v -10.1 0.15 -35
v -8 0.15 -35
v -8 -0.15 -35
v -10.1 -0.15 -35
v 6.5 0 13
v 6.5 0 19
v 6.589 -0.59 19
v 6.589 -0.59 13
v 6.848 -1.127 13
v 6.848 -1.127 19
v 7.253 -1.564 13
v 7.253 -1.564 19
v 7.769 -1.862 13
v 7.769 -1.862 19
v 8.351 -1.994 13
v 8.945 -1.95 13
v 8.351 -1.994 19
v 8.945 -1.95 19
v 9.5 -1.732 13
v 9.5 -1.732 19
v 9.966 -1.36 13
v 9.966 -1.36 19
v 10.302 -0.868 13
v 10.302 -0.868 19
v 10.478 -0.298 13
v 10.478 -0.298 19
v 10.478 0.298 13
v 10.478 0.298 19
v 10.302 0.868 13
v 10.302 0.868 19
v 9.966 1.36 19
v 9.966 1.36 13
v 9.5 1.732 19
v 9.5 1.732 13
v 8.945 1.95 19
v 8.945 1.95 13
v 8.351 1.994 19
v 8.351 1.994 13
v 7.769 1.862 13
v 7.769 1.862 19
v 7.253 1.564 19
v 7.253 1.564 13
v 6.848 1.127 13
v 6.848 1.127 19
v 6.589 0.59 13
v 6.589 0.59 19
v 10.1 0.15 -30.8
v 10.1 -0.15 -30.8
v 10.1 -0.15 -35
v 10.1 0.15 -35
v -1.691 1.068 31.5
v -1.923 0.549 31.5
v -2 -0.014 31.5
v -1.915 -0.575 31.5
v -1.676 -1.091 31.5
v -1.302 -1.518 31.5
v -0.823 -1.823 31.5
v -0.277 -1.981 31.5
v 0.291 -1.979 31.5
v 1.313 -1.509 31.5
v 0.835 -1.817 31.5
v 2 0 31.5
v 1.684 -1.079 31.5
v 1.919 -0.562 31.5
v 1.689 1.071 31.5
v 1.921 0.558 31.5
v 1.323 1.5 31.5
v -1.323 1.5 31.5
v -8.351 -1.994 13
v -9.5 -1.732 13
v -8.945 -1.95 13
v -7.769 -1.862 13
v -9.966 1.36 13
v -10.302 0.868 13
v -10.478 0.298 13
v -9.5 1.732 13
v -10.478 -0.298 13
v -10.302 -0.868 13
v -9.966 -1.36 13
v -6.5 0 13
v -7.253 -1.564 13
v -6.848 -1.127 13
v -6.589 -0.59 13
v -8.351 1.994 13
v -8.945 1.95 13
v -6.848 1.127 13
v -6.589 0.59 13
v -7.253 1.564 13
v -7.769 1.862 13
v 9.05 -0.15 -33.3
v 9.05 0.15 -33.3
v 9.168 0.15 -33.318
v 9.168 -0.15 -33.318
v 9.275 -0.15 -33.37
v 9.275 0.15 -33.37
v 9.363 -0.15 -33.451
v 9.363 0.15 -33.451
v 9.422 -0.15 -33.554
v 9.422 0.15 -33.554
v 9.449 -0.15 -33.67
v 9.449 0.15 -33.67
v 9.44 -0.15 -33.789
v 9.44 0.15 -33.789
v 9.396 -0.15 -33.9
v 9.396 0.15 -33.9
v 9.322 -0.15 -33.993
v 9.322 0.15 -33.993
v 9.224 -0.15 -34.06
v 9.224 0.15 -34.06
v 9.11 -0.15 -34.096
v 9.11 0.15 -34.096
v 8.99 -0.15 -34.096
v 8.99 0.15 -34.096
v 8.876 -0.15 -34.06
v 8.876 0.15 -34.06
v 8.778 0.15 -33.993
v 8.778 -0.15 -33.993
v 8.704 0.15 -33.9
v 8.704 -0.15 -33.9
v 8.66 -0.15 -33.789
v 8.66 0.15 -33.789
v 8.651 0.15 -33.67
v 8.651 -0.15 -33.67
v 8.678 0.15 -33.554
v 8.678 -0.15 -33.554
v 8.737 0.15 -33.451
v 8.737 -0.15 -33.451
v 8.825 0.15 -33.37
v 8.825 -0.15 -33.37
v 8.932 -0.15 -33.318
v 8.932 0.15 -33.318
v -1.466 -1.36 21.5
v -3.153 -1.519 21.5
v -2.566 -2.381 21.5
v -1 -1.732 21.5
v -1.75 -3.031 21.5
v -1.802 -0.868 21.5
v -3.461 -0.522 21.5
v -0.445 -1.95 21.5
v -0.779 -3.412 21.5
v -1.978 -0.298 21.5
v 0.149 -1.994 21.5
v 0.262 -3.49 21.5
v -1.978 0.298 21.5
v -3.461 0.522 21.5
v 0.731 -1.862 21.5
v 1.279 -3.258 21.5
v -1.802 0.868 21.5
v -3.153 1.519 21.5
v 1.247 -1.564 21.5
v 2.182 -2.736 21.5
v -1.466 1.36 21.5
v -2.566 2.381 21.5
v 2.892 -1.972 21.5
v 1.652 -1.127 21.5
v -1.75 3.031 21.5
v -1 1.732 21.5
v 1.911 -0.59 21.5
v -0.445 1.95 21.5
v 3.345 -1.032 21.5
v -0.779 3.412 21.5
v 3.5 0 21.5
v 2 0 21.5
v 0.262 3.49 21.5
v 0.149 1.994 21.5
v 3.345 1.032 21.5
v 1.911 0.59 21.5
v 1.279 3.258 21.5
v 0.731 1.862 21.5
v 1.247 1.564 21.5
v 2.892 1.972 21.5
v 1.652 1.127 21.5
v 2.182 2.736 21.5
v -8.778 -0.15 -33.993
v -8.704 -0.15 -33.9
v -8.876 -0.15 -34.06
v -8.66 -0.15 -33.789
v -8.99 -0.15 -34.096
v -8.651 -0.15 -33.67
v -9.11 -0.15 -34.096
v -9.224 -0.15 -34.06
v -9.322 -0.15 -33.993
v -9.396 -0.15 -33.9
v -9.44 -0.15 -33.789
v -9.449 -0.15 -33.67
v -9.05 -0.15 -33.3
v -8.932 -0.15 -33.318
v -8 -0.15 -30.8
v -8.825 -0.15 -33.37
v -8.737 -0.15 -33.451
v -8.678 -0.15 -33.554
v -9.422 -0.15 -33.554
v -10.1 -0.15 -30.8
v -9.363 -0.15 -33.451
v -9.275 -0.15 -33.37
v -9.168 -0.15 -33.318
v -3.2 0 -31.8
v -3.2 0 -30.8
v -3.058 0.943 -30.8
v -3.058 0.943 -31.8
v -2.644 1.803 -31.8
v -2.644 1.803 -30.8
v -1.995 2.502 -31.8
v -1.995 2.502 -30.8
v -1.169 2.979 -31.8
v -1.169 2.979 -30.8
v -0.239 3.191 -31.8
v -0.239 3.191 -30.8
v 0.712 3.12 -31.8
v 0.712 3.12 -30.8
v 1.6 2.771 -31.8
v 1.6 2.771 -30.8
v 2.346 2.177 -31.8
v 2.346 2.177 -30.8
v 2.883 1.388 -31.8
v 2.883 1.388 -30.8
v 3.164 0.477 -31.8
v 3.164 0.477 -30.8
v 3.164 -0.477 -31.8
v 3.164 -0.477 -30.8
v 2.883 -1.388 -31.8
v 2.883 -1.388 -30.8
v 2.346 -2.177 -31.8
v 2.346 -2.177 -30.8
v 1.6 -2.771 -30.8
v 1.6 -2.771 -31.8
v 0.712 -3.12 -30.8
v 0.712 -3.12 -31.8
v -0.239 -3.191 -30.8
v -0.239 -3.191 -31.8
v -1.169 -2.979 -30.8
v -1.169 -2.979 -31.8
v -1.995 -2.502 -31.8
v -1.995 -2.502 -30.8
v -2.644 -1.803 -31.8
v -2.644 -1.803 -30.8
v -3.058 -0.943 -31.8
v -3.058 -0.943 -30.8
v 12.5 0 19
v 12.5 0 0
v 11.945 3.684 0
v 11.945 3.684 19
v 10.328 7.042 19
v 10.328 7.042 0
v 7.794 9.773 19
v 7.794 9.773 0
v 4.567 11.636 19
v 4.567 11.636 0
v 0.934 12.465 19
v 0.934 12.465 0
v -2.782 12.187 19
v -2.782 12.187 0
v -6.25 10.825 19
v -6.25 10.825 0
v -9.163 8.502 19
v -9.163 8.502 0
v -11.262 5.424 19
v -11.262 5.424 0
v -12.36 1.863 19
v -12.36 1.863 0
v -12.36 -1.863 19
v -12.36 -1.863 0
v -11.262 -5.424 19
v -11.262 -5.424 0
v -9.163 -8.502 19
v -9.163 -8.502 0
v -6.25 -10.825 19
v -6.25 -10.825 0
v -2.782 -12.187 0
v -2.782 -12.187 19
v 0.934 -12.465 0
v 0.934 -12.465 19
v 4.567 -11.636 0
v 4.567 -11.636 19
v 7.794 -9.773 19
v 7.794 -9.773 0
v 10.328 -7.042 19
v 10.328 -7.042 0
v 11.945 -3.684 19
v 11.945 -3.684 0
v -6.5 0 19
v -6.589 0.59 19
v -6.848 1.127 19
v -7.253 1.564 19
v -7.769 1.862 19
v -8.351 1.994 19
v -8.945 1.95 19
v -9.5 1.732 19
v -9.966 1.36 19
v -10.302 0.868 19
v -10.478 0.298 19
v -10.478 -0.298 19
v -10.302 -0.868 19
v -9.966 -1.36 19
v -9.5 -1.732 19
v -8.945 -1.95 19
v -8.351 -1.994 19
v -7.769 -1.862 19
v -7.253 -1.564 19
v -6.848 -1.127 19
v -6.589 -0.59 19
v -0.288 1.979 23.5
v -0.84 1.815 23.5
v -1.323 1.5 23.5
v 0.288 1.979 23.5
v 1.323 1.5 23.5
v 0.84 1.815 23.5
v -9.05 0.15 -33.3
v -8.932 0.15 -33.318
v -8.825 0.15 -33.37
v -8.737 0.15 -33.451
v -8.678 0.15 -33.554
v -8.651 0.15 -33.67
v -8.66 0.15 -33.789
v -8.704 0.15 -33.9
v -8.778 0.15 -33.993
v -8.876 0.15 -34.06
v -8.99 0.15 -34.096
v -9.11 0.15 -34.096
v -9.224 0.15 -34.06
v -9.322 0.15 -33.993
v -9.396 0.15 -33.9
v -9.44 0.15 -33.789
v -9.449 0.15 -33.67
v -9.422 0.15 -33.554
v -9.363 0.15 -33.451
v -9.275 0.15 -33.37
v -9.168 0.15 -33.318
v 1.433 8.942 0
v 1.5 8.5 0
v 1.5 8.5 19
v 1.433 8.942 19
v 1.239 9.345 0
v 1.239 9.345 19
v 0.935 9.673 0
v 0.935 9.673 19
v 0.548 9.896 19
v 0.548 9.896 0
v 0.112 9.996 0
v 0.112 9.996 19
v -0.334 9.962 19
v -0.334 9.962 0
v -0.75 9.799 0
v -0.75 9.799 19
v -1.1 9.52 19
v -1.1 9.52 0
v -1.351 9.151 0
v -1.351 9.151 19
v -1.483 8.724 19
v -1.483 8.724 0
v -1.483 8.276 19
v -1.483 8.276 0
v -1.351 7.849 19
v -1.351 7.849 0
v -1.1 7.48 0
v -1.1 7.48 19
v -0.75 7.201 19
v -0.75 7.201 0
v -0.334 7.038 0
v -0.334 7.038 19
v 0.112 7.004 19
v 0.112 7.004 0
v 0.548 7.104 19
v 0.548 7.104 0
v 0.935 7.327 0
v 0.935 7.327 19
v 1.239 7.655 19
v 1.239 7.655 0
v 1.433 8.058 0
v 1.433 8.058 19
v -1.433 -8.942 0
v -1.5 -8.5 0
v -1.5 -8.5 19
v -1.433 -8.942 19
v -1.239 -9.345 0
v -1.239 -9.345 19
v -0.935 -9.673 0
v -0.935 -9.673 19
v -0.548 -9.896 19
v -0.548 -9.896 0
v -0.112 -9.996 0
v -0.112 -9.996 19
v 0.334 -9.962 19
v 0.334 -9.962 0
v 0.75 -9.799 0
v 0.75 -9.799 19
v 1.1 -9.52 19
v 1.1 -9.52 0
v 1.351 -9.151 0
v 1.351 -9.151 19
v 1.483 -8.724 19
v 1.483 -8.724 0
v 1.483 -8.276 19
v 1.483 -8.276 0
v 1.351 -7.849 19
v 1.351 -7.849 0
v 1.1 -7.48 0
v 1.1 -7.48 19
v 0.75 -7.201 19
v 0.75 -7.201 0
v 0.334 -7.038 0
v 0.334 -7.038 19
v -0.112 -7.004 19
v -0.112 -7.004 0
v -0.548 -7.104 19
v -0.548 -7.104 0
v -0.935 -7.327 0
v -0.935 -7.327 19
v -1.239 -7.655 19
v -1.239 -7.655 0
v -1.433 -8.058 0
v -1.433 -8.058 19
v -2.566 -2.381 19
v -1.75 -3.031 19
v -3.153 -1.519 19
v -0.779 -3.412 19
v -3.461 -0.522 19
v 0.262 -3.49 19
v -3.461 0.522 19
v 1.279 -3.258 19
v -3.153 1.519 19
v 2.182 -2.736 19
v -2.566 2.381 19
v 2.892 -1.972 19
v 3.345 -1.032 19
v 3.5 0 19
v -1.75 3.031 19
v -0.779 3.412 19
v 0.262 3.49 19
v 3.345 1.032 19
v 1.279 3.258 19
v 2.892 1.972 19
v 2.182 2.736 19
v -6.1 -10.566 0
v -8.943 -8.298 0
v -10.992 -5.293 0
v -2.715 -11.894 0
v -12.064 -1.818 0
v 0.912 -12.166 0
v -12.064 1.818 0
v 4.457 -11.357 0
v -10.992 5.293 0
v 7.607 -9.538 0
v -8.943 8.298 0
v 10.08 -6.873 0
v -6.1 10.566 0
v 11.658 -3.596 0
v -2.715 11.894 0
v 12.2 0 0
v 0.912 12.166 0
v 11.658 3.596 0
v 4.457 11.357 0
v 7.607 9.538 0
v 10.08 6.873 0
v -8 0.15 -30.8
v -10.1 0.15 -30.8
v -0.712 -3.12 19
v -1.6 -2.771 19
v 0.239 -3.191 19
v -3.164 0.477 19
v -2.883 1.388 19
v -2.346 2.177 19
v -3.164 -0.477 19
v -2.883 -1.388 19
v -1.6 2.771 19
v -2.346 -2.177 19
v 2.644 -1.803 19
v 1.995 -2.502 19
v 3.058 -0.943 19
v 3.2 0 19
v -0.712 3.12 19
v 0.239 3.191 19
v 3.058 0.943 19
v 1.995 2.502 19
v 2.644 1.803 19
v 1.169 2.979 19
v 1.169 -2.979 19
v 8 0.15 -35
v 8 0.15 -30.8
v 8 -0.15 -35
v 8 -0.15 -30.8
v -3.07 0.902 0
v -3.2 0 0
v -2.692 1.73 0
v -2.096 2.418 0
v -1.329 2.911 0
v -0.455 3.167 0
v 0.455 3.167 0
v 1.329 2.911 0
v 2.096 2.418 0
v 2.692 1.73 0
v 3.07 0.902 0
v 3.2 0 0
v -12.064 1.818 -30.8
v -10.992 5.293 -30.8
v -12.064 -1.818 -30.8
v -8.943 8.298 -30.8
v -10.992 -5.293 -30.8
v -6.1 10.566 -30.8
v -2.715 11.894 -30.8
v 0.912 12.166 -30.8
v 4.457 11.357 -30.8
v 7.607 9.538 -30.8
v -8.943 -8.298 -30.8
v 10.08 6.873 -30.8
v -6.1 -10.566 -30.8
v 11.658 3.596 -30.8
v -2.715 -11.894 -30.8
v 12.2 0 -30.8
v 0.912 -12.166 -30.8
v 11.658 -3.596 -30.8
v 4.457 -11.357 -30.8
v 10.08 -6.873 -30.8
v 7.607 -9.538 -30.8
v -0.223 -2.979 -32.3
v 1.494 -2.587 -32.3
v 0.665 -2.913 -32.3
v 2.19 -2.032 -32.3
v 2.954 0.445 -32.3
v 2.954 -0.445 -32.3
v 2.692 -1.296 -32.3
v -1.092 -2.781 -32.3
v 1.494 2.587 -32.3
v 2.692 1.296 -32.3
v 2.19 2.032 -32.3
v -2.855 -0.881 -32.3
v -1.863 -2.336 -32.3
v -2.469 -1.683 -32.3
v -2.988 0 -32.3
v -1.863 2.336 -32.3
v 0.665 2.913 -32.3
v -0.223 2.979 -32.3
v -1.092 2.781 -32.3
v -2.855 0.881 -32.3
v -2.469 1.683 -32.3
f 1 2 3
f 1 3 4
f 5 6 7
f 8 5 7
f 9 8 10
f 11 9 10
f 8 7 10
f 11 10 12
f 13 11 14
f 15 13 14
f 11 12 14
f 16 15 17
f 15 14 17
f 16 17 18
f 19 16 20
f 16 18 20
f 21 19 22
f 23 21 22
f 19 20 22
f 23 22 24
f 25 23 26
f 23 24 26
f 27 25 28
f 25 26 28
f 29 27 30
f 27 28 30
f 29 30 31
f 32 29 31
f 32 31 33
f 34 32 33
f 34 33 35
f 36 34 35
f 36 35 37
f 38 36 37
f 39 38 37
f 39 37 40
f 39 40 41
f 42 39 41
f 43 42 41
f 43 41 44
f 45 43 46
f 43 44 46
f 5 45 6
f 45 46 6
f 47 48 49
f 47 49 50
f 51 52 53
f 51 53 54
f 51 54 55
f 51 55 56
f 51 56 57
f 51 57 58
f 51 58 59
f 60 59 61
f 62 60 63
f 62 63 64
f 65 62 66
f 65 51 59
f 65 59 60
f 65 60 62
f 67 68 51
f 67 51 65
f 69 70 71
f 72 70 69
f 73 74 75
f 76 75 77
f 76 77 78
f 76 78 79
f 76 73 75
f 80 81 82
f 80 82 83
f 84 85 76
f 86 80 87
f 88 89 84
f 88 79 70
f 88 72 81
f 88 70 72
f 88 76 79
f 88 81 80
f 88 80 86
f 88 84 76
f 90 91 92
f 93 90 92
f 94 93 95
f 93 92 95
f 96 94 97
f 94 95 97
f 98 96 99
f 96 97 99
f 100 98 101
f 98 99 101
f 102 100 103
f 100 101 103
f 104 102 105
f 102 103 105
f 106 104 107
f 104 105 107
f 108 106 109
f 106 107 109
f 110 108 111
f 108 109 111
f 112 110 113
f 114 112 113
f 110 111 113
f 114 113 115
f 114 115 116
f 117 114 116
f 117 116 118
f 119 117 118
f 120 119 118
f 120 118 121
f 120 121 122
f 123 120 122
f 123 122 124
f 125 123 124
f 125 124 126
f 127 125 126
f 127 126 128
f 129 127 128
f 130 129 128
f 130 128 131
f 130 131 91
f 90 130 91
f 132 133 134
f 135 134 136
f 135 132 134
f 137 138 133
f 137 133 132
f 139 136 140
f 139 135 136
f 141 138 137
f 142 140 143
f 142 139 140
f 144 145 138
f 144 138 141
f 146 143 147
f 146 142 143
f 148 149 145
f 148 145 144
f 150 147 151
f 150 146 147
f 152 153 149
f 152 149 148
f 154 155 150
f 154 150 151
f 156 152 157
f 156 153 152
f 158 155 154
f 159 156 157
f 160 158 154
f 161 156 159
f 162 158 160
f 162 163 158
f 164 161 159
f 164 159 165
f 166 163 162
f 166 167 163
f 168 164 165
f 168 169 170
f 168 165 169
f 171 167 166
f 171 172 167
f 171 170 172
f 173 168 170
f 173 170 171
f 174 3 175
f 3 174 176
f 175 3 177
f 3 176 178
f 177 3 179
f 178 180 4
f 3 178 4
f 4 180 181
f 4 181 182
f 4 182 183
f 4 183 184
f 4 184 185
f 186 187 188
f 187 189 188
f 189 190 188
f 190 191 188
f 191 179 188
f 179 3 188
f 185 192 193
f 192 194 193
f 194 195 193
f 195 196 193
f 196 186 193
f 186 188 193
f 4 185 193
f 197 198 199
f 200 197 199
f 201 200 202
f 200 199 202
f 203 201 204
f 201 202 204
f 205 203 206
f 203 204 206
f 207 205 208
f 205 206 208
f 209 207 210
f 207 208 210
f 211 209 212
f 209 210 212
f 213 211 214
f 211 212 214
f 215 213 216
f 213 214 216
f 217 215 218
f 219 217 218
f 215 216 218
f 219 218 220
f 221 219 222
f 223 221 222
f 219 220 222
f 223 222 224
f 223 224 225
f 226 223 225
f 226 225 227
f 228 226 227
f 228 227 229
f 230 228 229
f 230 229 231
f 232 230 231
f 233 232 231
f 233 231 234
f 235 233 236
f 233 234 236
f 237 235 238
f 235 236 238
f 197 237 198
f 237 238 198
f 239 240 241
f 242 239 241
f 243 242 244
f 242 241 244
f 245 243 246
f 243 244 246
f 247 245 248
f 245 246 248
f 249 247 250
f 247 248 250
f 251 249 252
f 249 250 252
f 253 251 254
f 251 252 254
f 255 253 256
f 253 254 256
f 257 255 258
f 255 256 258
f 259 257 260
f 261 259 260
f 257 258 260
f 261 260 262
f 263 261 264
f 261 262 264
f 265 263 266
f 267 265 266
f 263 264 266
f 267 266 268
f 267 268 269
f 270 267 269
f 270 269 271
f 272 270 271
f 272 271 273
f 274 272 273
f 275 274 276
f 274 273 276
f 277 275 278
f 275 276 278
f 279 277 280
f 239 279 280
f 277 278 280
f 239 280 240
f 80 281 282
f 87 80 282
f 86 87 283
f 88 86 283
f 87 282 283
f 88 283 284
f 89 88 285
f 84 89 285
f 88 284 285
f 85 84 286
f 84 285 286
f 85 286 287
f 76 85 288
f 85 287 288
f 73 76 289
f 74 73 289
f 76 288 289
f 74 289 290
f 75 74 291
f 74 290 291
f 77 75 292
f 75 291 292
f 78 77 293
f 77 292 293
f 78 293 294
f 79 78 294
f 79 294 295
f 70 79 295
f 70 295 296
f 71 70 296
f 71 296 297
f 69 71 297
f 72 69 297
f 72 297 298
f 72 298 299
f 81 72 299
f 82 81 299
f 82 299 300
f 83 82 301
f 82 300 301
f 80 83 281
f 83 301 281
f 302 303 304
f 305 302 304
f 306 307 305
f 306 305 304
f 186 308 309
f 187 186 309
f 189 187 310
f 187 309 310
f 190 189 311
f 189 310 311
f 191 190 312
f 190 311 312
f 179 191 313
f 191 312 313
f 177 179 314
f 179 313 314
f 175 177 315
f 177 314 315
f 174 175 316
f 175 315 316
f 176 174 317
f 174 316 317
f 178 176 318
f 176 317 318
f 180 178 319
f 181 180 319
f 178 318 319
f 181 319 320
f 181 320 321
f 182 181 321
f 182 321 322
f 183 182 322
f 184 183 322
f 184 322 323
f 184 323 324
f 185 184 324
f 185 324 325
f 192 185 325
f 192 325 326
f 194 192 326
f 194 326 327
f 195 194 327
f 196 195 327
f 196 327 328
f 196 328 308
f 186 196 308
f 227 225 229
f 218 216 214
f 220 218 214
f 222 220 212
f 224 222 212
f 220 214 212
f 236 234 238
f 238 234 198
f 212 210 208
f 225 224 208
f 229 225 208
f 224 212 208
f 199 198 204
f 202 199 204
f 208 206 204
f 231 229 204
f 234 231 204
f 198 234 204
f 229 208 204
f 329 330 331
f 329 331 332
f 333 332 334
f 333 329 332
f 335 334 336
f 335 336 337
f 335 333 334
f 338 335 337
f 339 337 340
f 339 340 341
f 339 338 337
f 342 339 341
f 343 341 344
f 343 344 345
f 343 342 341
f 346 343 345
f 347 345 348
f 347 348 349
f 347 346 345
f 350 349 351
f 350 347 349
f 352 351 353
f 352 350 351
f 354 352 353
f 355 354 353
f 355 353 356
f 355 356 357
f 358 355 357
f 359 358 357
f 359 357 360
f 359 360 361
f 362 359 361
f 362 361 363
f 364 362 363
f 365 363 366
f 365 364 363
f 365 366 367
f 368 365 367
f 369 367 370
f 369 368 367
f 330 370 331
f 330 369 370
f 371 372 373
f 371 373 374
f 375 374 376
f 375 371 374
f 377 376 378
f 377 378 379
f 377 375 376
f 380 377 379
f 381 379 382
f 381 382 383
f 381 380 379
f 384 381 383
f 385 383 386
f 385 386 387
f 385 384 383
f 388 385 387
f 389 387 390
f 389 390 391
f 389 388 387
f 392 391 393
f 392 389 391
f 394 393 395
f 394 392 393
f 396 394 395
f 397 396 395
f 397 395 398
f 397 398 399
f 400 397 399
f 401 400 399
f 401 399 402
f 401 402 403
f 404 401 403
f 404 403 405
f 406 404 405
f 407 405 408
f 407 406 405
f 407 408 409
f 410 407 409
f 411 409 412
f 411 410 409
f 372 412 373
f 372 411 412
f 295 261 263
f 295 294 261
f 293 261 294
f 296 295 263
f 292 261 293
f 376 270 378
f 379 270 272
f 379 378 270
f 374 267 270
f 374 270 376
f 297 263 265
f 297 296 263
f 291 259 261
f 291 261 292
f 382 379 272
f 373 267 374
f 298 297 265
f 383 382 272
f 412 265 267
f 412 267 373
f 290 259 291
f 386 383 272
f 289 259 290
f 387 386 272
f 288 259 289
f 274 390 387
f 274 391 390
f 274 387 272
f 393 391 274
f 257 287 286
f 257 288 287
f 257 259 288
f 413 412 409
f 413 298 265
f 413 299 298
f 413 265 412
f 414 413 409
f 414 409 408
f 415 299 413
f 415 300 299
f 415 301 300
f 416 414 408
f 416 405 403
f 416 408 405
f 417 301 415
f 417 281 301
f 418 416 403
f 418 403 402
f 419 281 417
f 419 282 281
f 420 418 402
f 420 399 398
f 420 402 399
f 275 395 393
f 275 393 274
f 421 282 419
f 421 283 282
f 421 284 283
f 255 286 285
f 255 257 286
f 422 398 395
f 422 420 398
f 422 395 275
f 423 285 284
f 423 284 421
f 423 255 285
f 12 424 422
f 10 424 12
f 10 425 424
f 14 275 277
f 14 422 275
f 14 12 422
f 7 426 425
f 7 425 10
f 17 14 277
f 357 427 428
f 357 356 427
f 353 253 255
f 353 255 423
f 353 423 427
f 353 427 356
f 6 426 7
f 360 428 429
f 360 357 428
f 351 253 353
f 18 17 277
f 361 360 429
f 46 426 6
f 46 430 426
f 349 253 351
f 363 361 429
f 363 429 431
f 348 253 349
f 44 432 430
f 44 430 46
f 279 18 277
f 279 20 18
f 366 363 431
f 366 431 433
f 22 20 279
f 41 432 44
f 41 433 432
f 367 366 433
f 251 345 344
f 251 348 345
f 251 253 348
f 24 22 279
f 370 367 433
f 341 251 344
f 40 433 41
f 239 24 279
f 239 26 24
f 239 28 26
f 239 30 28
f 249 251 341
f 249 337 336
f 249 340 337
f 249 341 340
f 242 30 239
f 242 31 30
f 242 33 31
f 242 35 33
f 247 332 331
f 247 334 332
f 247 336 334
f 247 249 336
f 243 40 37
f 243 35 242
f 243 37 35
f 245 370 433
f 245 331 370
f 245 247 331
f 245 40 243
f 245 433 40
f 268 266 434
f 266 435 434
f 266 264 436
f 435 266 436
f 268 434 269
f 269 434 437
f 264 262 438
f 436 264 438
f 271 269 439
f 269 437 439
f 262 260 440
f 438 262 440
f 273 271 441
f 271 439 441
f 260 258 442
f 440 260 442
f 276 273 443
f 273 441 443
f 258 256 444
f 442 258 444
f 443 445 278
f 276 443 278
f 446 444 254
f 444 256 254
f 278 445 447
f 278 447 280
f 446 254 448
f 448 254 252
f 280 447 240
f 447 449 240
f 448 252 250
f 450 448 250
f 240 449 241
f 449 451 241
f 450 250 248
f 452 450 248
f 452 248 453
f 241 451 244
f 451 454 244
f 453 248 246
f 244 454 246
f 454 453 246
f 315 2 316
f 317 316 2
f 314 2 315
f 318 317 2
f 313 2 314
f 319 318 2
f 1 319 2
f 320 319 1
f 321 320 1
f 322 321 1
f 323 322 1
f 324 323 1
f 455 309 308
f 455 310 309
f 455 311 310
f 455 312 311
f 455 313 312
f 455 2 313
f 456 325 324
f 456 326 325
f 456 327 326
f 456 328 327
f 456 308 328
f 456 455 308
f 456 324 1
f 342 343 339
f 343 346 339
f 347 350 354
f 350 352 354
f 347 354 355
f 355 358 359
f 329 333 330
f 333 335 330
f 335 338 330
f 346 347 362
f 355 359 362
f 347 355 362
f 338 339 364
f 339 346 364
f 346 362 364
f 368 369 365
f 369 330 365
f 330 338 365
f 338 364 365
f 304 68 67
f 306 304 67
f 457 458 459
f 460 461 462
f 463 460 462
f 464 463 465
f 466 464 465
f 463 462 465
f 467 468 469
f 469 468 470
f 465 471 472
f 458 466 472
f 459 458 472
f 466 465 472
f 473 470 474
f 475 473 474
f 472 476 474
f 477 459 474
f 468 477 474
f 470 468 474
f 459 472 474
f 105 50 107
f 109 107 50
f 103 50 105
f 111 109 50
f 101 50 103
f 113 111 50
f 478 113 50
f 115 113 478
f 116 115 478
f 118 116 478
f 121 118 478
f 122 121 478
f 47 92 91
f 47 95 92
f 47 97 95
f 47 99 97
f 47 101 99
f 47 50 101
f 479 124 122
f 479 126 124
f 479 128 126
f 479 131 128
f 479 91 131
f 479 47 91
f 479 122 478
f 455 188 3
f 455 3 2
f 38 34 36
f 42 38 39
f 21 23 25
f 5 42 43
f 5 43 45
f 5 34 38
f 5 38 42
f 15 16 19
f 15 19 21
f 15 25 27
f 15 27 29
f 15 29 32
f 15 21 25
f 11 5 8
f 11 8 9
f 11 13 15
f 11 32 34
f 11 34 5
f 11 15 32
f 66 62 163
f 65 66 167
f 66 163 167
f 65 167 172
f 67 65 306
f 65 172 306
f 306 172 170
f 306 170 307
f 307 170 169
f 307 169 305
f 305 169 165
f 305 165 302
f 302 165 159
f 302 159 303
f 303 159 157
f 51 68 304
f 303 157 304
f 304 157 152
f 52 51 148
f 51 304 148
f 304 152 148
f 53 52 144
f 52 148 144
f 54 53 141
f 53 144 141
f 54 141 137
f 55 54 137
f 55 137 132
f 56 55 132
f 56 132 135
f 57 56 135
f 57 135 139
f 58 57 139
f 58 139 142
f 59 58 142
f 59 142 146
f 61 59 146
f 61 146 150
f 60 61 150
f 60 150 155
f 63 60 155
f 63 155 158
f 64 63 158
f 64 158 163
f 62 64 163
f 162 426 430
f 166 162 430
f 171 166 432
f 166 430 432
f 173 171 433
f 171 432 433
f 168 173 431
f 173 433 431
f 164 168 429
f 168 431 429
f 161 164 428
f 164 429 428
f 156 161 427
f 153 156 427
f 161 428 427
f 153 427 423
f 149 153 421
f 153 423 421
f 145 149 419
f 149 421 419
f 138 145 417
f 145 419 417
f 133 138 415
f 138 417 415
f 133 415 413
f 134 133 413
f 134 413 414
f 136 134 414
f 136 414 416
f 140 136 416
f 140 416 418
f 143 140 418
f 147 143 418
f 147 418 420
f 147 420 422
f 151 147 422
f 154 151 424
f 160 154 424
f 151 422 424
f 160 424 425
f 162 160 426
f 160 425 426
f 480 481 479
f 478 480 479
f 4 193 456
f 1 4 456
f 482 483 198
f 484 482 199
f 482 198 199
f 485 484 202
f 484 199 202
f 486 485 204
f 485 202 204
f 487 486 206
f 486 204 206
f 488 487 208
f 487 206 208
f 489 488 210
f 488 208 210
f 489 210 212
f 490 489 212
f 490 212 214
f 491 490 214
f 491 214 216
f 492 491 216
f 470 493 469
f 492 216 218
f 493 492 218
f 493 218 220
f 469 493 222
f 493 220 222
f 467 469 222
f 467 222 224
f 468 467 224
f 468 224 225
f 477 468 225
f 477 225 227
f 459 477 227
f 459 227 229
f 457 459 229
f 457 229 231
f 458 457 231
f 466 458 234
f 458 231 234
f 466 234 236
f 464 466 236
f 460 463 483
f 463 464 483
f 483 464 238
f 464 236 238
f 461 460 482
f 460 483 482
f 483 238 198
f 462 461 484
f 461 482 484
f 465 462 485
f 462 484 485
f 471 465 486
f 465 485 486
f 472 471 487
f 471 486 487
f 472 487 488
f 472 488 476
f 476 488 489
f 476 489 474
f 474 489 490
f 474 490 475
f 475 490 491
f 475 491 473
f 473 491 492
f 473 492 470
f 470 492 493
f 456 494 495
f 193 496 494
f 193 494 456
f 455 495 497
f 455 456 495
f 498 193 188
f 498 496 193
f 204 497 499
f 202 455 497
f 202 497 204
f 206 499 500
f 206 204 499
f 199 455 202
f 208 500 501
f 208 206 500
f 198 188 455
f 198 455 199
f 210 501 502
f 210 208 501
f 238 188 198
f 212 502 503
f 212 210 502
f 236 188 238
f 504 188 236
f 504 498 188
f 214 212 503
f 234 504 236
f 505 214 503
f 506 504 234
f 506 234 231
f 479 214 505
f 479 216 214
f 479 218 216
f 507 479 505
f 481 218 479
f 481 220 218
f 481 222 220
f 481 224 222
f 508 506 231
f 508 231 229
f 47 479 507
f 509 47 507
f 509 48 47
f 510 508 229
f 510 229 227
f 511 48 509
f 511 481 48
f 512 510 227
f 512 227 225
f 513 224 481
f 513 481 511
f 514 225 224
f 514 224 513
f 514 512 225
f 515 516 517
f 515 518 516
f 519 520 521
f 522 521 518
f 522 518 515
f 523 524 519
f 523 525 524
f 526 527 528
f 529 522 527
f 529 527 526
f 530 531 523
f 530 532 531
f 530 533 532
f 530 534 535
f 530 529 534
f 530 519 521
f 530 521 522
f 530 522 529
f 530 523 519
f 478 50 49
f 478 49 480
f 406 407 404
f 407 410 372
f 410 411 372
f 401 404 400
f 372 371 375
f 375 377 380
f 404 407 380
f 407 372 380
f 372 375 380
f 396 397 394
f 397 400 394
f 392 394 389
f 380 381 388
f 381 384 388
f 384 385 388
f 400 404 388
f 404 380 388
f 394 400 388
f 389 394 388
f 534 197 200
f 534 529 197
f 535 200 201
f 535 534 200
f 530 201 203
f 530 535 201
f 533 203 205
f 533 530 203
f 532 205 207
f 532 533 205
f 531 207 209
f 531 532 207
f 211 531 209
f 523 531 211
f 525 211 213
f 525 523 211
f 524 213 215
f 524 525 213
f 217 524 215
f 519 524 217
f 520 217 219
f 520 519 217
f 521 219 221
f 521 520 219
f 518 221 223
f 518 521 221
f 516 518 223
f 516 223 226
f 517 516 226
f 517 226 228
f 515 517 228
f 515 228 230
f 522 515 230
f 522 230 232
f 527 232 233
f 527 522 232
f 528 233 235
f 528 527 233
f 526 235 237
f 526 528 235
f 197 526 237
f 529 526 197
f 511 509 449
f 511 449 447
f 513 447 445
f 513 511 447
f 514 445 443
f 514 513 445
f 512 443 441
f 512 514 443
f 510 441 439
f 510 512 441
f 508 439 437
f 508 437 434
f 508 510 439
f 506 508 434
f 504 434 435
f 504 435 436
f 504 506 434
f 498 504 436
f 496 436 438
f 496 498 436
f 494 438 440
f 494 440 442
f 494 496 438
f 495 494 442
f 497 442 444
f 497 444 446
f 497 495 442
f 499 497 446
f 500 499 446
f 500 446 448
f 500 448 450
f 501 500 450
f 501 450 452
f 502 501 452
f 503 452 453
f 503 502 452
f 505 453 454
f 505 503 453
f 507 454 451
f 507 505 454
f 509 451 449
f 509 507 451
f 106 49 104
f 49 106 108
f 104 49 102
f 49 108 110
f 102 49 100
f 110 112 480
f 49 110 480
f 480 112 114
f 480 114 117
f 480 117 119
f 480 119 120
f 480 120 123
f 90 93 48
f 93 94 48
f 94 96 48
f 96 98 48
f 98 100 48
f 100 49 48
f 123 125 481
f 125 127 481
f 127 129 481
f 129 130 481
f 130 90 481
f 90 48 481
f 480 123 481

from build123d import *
from build123d.topology import SkipClean

# Parameters (mm, degrees)
SKETCH1_R           = 12.5
SKETCH1_R_2         = 3.2
SKETCH1_R_3         = 1.5
BOSS_EXTRUDE1_DEPTH = 19
BOSS_EXTRUDE2_START = 30.8
SKETCH3_R           = 12.2
SKETCH3_R_2         = 3.2
BOSS_EXTRUDE2_DEPTH = 30.8
SKETCH4_W           = 2.1
SKETCH4_H           = 0.3
BOSS_EXTRUDE3_DEPTH = 4.2
SKETCH6_R           = 3.5
SKETCH6_R_2         = 2
BOSS_EXTRUDE4_DEPTH = 2.5
SKETCH7_R           = 2
BOSS_EXTRUDE5_DEPTH = 12.5
CUT_EXTRUDE1_DEPTH  = 8
SKETCH10_R          = 2
CUT_EXTRUDE2_DEPTH  = 6
SKETCH11_R          = 3.2
BOSS_EXTRUDE6_DEPTH = 1
SKETCH12_R          = 3.2
BOSS_EXTRUDE7_DEPTH = 0.5
BOSS_EXTRUDE7_TAPER = 23
SKETCH13_R          = 0.4
CUT_EXTRUDE3_DEPTH  = 0.5
SKETCH14_R          = 0.4
CUT_EXTRUDE4_DEPTH  = 0.5


with BuildPart() as part:
    # Sketch1 → Boss-Extrude1 (new body)
    with BuildSketch(Plane.XY):
        Circle(SKETCH1_R)
        Circle(SKETCH1_R_2, mode=Mode.SUBTRACT)
        with Locations((0, 8.5)):
            Circle(SKETCH1_R_3, mode=Mode.SUBTRACT)
        with Locations(Location((0, -8.5, 0), (0, 0, 180))):
            Circle(SKETCH1_R_3, mode=Mode.SUBTRACT)
    extrude(amount=BOSS_EXTRUDE1_DEPTH)

    # Sketch3 → Boss-Extrude2 (add)
    with SkipClean():  # the faces are left unmerged after this step: merging them gives an invalid solid
        with BuildSketch(Plane(origin=(0, 0, 0), x_dir=(-1, 0, 0), z_dir=(0, 0, -1)).offset(BOSS_EXTRUDE2_START)):
            with Locations(Location((0, 0, 0), (0, 0, 180))):
                Circle(SKETCH3_R)
            Circle(SKETCH3_R_2, mode=Mode.SUBTRACT)
        extrude(amount=-BOSS_EXTRUDE2_DEPTH)

    # Sketch4 → Boss-Extrude3 (add)
    with SkipClean():  # the faces are left unmerged after this step: merging them gives an invalid solid
        with BuildSketch(Plane(origin=(0, 0, -30.8), x_dir=(-1, 0, 0), z_dir=(0, 0, -1))):
            with Locations((9.05, 0)):
                Rectangle(SKETCH4_W, SKETCH4_H)
            with Locations((-9.05, 0)):
                Rectangle(SKETCH4_W, SKETCH4_H)
        extrude(amount=BOSS_EXTRUDE3_DEPTH)

    # Sketch6 → Boss-Extrude4 (add)
    with BuildSketch(Plane.XY.offset(19)):
        Circle(SKETCH6_R)
        Circle(SKETCH6_R_2, mode=Mode.SUBTRACT)
    extrude(amount=BOSS_EXTRUDE4_DEPTH)

    # Sketch7 → Boss-Extrude5 (add)
    with BuildSketch(Plane.XY.offset(19)):
        Circle(SKETCH7_R)
    extrude(amount=BOSS_EXTRUDE5_DEPTH)

    # Sketch9 → Cut-Extrude1 (cut)
    with BuildSketch(Plane.XY.offset(31.5)):
        Polygon((-50.671161076, 1.5), (-1.322875656, 1.5), (1.322875656, 1.5), (50.671161076, 1.5), (50.671161076, 100.196570842), (-50.671161076, 100.196570842), align=None)
    extrude(amount=-CUT_EXTRUDE1_DEPTH, mode=Mode.SUBTRACT)

    # Sketch10 → Cut-Extrude2 (cut)
    with BuildSketch(Plane.XY.offset(19)):
        with Locations((-8.5, 0)):
            Circle(SKETCH10_R)
        with Locations(Location((8.5, 0, 0), (0, 0, 180))):
            Circle(SKETCH10_R)
    extrude(amount=-CUT_EXTRUDE2_DEPTH, mode=Mode.SUBTRACT)

    # Sketch13 → Cut-Extrude3 (cut)
    with BuildSketch(Plane(origin=(0, 0.15, 0), x_dir=(1, 0, 0), z_dir=(0, 1, 0))):
        with Locations(Location((9.05, 33.7, 0), (0, 0, 270))):
            Circle(SKETCH13_R)
    extrude(amount=-CUT_EXTRUDE3_DEPTH, mode=Mode.SUBTRACT)

    # Sketch14 → Cut-Extrude4 (cut)
    with BuildSketch(Plane(origin=(0, 0.15, 0), x_dir=(1, 0, 0), z_dir=(0, 1, 0))):
        with Locations(Location((-9.05, 33.7, 0), (0, 0, 270))):
            Circle(SKETCH14_R)
    extrude(amount=-CUT_EXTRUDE4_DEPTH, mode=Mode.SUBTRACT)


with BuildPart() as body_2:
    # Sketch11 → Boss-Extrude6 (new body)
    with BuildSketch(Plane(origin=(0, 0, -30.8), x_dir=(-1, 0, 0), z_dir=(0, 0, -1))):
        Circle(SKETCH11_R)
    extrude(amount=BOSS_EXTRUDE6_DEPTH)

    # Sketch12 → Boss-Extrude7 (add)
    with BuildSketch(Plane(origin=(0, 0, -31.8), x_dir=(-1, 0, 0), z_dir=(0, 0, -1))):
        Circle(SKETCH12_R)
    extrude(amount=BOSS_EXTRUDE7_DEPTH, taper=BOSS_EXTRUDE7_TAPER)


solid = Compound([part.part, body_2.part])
